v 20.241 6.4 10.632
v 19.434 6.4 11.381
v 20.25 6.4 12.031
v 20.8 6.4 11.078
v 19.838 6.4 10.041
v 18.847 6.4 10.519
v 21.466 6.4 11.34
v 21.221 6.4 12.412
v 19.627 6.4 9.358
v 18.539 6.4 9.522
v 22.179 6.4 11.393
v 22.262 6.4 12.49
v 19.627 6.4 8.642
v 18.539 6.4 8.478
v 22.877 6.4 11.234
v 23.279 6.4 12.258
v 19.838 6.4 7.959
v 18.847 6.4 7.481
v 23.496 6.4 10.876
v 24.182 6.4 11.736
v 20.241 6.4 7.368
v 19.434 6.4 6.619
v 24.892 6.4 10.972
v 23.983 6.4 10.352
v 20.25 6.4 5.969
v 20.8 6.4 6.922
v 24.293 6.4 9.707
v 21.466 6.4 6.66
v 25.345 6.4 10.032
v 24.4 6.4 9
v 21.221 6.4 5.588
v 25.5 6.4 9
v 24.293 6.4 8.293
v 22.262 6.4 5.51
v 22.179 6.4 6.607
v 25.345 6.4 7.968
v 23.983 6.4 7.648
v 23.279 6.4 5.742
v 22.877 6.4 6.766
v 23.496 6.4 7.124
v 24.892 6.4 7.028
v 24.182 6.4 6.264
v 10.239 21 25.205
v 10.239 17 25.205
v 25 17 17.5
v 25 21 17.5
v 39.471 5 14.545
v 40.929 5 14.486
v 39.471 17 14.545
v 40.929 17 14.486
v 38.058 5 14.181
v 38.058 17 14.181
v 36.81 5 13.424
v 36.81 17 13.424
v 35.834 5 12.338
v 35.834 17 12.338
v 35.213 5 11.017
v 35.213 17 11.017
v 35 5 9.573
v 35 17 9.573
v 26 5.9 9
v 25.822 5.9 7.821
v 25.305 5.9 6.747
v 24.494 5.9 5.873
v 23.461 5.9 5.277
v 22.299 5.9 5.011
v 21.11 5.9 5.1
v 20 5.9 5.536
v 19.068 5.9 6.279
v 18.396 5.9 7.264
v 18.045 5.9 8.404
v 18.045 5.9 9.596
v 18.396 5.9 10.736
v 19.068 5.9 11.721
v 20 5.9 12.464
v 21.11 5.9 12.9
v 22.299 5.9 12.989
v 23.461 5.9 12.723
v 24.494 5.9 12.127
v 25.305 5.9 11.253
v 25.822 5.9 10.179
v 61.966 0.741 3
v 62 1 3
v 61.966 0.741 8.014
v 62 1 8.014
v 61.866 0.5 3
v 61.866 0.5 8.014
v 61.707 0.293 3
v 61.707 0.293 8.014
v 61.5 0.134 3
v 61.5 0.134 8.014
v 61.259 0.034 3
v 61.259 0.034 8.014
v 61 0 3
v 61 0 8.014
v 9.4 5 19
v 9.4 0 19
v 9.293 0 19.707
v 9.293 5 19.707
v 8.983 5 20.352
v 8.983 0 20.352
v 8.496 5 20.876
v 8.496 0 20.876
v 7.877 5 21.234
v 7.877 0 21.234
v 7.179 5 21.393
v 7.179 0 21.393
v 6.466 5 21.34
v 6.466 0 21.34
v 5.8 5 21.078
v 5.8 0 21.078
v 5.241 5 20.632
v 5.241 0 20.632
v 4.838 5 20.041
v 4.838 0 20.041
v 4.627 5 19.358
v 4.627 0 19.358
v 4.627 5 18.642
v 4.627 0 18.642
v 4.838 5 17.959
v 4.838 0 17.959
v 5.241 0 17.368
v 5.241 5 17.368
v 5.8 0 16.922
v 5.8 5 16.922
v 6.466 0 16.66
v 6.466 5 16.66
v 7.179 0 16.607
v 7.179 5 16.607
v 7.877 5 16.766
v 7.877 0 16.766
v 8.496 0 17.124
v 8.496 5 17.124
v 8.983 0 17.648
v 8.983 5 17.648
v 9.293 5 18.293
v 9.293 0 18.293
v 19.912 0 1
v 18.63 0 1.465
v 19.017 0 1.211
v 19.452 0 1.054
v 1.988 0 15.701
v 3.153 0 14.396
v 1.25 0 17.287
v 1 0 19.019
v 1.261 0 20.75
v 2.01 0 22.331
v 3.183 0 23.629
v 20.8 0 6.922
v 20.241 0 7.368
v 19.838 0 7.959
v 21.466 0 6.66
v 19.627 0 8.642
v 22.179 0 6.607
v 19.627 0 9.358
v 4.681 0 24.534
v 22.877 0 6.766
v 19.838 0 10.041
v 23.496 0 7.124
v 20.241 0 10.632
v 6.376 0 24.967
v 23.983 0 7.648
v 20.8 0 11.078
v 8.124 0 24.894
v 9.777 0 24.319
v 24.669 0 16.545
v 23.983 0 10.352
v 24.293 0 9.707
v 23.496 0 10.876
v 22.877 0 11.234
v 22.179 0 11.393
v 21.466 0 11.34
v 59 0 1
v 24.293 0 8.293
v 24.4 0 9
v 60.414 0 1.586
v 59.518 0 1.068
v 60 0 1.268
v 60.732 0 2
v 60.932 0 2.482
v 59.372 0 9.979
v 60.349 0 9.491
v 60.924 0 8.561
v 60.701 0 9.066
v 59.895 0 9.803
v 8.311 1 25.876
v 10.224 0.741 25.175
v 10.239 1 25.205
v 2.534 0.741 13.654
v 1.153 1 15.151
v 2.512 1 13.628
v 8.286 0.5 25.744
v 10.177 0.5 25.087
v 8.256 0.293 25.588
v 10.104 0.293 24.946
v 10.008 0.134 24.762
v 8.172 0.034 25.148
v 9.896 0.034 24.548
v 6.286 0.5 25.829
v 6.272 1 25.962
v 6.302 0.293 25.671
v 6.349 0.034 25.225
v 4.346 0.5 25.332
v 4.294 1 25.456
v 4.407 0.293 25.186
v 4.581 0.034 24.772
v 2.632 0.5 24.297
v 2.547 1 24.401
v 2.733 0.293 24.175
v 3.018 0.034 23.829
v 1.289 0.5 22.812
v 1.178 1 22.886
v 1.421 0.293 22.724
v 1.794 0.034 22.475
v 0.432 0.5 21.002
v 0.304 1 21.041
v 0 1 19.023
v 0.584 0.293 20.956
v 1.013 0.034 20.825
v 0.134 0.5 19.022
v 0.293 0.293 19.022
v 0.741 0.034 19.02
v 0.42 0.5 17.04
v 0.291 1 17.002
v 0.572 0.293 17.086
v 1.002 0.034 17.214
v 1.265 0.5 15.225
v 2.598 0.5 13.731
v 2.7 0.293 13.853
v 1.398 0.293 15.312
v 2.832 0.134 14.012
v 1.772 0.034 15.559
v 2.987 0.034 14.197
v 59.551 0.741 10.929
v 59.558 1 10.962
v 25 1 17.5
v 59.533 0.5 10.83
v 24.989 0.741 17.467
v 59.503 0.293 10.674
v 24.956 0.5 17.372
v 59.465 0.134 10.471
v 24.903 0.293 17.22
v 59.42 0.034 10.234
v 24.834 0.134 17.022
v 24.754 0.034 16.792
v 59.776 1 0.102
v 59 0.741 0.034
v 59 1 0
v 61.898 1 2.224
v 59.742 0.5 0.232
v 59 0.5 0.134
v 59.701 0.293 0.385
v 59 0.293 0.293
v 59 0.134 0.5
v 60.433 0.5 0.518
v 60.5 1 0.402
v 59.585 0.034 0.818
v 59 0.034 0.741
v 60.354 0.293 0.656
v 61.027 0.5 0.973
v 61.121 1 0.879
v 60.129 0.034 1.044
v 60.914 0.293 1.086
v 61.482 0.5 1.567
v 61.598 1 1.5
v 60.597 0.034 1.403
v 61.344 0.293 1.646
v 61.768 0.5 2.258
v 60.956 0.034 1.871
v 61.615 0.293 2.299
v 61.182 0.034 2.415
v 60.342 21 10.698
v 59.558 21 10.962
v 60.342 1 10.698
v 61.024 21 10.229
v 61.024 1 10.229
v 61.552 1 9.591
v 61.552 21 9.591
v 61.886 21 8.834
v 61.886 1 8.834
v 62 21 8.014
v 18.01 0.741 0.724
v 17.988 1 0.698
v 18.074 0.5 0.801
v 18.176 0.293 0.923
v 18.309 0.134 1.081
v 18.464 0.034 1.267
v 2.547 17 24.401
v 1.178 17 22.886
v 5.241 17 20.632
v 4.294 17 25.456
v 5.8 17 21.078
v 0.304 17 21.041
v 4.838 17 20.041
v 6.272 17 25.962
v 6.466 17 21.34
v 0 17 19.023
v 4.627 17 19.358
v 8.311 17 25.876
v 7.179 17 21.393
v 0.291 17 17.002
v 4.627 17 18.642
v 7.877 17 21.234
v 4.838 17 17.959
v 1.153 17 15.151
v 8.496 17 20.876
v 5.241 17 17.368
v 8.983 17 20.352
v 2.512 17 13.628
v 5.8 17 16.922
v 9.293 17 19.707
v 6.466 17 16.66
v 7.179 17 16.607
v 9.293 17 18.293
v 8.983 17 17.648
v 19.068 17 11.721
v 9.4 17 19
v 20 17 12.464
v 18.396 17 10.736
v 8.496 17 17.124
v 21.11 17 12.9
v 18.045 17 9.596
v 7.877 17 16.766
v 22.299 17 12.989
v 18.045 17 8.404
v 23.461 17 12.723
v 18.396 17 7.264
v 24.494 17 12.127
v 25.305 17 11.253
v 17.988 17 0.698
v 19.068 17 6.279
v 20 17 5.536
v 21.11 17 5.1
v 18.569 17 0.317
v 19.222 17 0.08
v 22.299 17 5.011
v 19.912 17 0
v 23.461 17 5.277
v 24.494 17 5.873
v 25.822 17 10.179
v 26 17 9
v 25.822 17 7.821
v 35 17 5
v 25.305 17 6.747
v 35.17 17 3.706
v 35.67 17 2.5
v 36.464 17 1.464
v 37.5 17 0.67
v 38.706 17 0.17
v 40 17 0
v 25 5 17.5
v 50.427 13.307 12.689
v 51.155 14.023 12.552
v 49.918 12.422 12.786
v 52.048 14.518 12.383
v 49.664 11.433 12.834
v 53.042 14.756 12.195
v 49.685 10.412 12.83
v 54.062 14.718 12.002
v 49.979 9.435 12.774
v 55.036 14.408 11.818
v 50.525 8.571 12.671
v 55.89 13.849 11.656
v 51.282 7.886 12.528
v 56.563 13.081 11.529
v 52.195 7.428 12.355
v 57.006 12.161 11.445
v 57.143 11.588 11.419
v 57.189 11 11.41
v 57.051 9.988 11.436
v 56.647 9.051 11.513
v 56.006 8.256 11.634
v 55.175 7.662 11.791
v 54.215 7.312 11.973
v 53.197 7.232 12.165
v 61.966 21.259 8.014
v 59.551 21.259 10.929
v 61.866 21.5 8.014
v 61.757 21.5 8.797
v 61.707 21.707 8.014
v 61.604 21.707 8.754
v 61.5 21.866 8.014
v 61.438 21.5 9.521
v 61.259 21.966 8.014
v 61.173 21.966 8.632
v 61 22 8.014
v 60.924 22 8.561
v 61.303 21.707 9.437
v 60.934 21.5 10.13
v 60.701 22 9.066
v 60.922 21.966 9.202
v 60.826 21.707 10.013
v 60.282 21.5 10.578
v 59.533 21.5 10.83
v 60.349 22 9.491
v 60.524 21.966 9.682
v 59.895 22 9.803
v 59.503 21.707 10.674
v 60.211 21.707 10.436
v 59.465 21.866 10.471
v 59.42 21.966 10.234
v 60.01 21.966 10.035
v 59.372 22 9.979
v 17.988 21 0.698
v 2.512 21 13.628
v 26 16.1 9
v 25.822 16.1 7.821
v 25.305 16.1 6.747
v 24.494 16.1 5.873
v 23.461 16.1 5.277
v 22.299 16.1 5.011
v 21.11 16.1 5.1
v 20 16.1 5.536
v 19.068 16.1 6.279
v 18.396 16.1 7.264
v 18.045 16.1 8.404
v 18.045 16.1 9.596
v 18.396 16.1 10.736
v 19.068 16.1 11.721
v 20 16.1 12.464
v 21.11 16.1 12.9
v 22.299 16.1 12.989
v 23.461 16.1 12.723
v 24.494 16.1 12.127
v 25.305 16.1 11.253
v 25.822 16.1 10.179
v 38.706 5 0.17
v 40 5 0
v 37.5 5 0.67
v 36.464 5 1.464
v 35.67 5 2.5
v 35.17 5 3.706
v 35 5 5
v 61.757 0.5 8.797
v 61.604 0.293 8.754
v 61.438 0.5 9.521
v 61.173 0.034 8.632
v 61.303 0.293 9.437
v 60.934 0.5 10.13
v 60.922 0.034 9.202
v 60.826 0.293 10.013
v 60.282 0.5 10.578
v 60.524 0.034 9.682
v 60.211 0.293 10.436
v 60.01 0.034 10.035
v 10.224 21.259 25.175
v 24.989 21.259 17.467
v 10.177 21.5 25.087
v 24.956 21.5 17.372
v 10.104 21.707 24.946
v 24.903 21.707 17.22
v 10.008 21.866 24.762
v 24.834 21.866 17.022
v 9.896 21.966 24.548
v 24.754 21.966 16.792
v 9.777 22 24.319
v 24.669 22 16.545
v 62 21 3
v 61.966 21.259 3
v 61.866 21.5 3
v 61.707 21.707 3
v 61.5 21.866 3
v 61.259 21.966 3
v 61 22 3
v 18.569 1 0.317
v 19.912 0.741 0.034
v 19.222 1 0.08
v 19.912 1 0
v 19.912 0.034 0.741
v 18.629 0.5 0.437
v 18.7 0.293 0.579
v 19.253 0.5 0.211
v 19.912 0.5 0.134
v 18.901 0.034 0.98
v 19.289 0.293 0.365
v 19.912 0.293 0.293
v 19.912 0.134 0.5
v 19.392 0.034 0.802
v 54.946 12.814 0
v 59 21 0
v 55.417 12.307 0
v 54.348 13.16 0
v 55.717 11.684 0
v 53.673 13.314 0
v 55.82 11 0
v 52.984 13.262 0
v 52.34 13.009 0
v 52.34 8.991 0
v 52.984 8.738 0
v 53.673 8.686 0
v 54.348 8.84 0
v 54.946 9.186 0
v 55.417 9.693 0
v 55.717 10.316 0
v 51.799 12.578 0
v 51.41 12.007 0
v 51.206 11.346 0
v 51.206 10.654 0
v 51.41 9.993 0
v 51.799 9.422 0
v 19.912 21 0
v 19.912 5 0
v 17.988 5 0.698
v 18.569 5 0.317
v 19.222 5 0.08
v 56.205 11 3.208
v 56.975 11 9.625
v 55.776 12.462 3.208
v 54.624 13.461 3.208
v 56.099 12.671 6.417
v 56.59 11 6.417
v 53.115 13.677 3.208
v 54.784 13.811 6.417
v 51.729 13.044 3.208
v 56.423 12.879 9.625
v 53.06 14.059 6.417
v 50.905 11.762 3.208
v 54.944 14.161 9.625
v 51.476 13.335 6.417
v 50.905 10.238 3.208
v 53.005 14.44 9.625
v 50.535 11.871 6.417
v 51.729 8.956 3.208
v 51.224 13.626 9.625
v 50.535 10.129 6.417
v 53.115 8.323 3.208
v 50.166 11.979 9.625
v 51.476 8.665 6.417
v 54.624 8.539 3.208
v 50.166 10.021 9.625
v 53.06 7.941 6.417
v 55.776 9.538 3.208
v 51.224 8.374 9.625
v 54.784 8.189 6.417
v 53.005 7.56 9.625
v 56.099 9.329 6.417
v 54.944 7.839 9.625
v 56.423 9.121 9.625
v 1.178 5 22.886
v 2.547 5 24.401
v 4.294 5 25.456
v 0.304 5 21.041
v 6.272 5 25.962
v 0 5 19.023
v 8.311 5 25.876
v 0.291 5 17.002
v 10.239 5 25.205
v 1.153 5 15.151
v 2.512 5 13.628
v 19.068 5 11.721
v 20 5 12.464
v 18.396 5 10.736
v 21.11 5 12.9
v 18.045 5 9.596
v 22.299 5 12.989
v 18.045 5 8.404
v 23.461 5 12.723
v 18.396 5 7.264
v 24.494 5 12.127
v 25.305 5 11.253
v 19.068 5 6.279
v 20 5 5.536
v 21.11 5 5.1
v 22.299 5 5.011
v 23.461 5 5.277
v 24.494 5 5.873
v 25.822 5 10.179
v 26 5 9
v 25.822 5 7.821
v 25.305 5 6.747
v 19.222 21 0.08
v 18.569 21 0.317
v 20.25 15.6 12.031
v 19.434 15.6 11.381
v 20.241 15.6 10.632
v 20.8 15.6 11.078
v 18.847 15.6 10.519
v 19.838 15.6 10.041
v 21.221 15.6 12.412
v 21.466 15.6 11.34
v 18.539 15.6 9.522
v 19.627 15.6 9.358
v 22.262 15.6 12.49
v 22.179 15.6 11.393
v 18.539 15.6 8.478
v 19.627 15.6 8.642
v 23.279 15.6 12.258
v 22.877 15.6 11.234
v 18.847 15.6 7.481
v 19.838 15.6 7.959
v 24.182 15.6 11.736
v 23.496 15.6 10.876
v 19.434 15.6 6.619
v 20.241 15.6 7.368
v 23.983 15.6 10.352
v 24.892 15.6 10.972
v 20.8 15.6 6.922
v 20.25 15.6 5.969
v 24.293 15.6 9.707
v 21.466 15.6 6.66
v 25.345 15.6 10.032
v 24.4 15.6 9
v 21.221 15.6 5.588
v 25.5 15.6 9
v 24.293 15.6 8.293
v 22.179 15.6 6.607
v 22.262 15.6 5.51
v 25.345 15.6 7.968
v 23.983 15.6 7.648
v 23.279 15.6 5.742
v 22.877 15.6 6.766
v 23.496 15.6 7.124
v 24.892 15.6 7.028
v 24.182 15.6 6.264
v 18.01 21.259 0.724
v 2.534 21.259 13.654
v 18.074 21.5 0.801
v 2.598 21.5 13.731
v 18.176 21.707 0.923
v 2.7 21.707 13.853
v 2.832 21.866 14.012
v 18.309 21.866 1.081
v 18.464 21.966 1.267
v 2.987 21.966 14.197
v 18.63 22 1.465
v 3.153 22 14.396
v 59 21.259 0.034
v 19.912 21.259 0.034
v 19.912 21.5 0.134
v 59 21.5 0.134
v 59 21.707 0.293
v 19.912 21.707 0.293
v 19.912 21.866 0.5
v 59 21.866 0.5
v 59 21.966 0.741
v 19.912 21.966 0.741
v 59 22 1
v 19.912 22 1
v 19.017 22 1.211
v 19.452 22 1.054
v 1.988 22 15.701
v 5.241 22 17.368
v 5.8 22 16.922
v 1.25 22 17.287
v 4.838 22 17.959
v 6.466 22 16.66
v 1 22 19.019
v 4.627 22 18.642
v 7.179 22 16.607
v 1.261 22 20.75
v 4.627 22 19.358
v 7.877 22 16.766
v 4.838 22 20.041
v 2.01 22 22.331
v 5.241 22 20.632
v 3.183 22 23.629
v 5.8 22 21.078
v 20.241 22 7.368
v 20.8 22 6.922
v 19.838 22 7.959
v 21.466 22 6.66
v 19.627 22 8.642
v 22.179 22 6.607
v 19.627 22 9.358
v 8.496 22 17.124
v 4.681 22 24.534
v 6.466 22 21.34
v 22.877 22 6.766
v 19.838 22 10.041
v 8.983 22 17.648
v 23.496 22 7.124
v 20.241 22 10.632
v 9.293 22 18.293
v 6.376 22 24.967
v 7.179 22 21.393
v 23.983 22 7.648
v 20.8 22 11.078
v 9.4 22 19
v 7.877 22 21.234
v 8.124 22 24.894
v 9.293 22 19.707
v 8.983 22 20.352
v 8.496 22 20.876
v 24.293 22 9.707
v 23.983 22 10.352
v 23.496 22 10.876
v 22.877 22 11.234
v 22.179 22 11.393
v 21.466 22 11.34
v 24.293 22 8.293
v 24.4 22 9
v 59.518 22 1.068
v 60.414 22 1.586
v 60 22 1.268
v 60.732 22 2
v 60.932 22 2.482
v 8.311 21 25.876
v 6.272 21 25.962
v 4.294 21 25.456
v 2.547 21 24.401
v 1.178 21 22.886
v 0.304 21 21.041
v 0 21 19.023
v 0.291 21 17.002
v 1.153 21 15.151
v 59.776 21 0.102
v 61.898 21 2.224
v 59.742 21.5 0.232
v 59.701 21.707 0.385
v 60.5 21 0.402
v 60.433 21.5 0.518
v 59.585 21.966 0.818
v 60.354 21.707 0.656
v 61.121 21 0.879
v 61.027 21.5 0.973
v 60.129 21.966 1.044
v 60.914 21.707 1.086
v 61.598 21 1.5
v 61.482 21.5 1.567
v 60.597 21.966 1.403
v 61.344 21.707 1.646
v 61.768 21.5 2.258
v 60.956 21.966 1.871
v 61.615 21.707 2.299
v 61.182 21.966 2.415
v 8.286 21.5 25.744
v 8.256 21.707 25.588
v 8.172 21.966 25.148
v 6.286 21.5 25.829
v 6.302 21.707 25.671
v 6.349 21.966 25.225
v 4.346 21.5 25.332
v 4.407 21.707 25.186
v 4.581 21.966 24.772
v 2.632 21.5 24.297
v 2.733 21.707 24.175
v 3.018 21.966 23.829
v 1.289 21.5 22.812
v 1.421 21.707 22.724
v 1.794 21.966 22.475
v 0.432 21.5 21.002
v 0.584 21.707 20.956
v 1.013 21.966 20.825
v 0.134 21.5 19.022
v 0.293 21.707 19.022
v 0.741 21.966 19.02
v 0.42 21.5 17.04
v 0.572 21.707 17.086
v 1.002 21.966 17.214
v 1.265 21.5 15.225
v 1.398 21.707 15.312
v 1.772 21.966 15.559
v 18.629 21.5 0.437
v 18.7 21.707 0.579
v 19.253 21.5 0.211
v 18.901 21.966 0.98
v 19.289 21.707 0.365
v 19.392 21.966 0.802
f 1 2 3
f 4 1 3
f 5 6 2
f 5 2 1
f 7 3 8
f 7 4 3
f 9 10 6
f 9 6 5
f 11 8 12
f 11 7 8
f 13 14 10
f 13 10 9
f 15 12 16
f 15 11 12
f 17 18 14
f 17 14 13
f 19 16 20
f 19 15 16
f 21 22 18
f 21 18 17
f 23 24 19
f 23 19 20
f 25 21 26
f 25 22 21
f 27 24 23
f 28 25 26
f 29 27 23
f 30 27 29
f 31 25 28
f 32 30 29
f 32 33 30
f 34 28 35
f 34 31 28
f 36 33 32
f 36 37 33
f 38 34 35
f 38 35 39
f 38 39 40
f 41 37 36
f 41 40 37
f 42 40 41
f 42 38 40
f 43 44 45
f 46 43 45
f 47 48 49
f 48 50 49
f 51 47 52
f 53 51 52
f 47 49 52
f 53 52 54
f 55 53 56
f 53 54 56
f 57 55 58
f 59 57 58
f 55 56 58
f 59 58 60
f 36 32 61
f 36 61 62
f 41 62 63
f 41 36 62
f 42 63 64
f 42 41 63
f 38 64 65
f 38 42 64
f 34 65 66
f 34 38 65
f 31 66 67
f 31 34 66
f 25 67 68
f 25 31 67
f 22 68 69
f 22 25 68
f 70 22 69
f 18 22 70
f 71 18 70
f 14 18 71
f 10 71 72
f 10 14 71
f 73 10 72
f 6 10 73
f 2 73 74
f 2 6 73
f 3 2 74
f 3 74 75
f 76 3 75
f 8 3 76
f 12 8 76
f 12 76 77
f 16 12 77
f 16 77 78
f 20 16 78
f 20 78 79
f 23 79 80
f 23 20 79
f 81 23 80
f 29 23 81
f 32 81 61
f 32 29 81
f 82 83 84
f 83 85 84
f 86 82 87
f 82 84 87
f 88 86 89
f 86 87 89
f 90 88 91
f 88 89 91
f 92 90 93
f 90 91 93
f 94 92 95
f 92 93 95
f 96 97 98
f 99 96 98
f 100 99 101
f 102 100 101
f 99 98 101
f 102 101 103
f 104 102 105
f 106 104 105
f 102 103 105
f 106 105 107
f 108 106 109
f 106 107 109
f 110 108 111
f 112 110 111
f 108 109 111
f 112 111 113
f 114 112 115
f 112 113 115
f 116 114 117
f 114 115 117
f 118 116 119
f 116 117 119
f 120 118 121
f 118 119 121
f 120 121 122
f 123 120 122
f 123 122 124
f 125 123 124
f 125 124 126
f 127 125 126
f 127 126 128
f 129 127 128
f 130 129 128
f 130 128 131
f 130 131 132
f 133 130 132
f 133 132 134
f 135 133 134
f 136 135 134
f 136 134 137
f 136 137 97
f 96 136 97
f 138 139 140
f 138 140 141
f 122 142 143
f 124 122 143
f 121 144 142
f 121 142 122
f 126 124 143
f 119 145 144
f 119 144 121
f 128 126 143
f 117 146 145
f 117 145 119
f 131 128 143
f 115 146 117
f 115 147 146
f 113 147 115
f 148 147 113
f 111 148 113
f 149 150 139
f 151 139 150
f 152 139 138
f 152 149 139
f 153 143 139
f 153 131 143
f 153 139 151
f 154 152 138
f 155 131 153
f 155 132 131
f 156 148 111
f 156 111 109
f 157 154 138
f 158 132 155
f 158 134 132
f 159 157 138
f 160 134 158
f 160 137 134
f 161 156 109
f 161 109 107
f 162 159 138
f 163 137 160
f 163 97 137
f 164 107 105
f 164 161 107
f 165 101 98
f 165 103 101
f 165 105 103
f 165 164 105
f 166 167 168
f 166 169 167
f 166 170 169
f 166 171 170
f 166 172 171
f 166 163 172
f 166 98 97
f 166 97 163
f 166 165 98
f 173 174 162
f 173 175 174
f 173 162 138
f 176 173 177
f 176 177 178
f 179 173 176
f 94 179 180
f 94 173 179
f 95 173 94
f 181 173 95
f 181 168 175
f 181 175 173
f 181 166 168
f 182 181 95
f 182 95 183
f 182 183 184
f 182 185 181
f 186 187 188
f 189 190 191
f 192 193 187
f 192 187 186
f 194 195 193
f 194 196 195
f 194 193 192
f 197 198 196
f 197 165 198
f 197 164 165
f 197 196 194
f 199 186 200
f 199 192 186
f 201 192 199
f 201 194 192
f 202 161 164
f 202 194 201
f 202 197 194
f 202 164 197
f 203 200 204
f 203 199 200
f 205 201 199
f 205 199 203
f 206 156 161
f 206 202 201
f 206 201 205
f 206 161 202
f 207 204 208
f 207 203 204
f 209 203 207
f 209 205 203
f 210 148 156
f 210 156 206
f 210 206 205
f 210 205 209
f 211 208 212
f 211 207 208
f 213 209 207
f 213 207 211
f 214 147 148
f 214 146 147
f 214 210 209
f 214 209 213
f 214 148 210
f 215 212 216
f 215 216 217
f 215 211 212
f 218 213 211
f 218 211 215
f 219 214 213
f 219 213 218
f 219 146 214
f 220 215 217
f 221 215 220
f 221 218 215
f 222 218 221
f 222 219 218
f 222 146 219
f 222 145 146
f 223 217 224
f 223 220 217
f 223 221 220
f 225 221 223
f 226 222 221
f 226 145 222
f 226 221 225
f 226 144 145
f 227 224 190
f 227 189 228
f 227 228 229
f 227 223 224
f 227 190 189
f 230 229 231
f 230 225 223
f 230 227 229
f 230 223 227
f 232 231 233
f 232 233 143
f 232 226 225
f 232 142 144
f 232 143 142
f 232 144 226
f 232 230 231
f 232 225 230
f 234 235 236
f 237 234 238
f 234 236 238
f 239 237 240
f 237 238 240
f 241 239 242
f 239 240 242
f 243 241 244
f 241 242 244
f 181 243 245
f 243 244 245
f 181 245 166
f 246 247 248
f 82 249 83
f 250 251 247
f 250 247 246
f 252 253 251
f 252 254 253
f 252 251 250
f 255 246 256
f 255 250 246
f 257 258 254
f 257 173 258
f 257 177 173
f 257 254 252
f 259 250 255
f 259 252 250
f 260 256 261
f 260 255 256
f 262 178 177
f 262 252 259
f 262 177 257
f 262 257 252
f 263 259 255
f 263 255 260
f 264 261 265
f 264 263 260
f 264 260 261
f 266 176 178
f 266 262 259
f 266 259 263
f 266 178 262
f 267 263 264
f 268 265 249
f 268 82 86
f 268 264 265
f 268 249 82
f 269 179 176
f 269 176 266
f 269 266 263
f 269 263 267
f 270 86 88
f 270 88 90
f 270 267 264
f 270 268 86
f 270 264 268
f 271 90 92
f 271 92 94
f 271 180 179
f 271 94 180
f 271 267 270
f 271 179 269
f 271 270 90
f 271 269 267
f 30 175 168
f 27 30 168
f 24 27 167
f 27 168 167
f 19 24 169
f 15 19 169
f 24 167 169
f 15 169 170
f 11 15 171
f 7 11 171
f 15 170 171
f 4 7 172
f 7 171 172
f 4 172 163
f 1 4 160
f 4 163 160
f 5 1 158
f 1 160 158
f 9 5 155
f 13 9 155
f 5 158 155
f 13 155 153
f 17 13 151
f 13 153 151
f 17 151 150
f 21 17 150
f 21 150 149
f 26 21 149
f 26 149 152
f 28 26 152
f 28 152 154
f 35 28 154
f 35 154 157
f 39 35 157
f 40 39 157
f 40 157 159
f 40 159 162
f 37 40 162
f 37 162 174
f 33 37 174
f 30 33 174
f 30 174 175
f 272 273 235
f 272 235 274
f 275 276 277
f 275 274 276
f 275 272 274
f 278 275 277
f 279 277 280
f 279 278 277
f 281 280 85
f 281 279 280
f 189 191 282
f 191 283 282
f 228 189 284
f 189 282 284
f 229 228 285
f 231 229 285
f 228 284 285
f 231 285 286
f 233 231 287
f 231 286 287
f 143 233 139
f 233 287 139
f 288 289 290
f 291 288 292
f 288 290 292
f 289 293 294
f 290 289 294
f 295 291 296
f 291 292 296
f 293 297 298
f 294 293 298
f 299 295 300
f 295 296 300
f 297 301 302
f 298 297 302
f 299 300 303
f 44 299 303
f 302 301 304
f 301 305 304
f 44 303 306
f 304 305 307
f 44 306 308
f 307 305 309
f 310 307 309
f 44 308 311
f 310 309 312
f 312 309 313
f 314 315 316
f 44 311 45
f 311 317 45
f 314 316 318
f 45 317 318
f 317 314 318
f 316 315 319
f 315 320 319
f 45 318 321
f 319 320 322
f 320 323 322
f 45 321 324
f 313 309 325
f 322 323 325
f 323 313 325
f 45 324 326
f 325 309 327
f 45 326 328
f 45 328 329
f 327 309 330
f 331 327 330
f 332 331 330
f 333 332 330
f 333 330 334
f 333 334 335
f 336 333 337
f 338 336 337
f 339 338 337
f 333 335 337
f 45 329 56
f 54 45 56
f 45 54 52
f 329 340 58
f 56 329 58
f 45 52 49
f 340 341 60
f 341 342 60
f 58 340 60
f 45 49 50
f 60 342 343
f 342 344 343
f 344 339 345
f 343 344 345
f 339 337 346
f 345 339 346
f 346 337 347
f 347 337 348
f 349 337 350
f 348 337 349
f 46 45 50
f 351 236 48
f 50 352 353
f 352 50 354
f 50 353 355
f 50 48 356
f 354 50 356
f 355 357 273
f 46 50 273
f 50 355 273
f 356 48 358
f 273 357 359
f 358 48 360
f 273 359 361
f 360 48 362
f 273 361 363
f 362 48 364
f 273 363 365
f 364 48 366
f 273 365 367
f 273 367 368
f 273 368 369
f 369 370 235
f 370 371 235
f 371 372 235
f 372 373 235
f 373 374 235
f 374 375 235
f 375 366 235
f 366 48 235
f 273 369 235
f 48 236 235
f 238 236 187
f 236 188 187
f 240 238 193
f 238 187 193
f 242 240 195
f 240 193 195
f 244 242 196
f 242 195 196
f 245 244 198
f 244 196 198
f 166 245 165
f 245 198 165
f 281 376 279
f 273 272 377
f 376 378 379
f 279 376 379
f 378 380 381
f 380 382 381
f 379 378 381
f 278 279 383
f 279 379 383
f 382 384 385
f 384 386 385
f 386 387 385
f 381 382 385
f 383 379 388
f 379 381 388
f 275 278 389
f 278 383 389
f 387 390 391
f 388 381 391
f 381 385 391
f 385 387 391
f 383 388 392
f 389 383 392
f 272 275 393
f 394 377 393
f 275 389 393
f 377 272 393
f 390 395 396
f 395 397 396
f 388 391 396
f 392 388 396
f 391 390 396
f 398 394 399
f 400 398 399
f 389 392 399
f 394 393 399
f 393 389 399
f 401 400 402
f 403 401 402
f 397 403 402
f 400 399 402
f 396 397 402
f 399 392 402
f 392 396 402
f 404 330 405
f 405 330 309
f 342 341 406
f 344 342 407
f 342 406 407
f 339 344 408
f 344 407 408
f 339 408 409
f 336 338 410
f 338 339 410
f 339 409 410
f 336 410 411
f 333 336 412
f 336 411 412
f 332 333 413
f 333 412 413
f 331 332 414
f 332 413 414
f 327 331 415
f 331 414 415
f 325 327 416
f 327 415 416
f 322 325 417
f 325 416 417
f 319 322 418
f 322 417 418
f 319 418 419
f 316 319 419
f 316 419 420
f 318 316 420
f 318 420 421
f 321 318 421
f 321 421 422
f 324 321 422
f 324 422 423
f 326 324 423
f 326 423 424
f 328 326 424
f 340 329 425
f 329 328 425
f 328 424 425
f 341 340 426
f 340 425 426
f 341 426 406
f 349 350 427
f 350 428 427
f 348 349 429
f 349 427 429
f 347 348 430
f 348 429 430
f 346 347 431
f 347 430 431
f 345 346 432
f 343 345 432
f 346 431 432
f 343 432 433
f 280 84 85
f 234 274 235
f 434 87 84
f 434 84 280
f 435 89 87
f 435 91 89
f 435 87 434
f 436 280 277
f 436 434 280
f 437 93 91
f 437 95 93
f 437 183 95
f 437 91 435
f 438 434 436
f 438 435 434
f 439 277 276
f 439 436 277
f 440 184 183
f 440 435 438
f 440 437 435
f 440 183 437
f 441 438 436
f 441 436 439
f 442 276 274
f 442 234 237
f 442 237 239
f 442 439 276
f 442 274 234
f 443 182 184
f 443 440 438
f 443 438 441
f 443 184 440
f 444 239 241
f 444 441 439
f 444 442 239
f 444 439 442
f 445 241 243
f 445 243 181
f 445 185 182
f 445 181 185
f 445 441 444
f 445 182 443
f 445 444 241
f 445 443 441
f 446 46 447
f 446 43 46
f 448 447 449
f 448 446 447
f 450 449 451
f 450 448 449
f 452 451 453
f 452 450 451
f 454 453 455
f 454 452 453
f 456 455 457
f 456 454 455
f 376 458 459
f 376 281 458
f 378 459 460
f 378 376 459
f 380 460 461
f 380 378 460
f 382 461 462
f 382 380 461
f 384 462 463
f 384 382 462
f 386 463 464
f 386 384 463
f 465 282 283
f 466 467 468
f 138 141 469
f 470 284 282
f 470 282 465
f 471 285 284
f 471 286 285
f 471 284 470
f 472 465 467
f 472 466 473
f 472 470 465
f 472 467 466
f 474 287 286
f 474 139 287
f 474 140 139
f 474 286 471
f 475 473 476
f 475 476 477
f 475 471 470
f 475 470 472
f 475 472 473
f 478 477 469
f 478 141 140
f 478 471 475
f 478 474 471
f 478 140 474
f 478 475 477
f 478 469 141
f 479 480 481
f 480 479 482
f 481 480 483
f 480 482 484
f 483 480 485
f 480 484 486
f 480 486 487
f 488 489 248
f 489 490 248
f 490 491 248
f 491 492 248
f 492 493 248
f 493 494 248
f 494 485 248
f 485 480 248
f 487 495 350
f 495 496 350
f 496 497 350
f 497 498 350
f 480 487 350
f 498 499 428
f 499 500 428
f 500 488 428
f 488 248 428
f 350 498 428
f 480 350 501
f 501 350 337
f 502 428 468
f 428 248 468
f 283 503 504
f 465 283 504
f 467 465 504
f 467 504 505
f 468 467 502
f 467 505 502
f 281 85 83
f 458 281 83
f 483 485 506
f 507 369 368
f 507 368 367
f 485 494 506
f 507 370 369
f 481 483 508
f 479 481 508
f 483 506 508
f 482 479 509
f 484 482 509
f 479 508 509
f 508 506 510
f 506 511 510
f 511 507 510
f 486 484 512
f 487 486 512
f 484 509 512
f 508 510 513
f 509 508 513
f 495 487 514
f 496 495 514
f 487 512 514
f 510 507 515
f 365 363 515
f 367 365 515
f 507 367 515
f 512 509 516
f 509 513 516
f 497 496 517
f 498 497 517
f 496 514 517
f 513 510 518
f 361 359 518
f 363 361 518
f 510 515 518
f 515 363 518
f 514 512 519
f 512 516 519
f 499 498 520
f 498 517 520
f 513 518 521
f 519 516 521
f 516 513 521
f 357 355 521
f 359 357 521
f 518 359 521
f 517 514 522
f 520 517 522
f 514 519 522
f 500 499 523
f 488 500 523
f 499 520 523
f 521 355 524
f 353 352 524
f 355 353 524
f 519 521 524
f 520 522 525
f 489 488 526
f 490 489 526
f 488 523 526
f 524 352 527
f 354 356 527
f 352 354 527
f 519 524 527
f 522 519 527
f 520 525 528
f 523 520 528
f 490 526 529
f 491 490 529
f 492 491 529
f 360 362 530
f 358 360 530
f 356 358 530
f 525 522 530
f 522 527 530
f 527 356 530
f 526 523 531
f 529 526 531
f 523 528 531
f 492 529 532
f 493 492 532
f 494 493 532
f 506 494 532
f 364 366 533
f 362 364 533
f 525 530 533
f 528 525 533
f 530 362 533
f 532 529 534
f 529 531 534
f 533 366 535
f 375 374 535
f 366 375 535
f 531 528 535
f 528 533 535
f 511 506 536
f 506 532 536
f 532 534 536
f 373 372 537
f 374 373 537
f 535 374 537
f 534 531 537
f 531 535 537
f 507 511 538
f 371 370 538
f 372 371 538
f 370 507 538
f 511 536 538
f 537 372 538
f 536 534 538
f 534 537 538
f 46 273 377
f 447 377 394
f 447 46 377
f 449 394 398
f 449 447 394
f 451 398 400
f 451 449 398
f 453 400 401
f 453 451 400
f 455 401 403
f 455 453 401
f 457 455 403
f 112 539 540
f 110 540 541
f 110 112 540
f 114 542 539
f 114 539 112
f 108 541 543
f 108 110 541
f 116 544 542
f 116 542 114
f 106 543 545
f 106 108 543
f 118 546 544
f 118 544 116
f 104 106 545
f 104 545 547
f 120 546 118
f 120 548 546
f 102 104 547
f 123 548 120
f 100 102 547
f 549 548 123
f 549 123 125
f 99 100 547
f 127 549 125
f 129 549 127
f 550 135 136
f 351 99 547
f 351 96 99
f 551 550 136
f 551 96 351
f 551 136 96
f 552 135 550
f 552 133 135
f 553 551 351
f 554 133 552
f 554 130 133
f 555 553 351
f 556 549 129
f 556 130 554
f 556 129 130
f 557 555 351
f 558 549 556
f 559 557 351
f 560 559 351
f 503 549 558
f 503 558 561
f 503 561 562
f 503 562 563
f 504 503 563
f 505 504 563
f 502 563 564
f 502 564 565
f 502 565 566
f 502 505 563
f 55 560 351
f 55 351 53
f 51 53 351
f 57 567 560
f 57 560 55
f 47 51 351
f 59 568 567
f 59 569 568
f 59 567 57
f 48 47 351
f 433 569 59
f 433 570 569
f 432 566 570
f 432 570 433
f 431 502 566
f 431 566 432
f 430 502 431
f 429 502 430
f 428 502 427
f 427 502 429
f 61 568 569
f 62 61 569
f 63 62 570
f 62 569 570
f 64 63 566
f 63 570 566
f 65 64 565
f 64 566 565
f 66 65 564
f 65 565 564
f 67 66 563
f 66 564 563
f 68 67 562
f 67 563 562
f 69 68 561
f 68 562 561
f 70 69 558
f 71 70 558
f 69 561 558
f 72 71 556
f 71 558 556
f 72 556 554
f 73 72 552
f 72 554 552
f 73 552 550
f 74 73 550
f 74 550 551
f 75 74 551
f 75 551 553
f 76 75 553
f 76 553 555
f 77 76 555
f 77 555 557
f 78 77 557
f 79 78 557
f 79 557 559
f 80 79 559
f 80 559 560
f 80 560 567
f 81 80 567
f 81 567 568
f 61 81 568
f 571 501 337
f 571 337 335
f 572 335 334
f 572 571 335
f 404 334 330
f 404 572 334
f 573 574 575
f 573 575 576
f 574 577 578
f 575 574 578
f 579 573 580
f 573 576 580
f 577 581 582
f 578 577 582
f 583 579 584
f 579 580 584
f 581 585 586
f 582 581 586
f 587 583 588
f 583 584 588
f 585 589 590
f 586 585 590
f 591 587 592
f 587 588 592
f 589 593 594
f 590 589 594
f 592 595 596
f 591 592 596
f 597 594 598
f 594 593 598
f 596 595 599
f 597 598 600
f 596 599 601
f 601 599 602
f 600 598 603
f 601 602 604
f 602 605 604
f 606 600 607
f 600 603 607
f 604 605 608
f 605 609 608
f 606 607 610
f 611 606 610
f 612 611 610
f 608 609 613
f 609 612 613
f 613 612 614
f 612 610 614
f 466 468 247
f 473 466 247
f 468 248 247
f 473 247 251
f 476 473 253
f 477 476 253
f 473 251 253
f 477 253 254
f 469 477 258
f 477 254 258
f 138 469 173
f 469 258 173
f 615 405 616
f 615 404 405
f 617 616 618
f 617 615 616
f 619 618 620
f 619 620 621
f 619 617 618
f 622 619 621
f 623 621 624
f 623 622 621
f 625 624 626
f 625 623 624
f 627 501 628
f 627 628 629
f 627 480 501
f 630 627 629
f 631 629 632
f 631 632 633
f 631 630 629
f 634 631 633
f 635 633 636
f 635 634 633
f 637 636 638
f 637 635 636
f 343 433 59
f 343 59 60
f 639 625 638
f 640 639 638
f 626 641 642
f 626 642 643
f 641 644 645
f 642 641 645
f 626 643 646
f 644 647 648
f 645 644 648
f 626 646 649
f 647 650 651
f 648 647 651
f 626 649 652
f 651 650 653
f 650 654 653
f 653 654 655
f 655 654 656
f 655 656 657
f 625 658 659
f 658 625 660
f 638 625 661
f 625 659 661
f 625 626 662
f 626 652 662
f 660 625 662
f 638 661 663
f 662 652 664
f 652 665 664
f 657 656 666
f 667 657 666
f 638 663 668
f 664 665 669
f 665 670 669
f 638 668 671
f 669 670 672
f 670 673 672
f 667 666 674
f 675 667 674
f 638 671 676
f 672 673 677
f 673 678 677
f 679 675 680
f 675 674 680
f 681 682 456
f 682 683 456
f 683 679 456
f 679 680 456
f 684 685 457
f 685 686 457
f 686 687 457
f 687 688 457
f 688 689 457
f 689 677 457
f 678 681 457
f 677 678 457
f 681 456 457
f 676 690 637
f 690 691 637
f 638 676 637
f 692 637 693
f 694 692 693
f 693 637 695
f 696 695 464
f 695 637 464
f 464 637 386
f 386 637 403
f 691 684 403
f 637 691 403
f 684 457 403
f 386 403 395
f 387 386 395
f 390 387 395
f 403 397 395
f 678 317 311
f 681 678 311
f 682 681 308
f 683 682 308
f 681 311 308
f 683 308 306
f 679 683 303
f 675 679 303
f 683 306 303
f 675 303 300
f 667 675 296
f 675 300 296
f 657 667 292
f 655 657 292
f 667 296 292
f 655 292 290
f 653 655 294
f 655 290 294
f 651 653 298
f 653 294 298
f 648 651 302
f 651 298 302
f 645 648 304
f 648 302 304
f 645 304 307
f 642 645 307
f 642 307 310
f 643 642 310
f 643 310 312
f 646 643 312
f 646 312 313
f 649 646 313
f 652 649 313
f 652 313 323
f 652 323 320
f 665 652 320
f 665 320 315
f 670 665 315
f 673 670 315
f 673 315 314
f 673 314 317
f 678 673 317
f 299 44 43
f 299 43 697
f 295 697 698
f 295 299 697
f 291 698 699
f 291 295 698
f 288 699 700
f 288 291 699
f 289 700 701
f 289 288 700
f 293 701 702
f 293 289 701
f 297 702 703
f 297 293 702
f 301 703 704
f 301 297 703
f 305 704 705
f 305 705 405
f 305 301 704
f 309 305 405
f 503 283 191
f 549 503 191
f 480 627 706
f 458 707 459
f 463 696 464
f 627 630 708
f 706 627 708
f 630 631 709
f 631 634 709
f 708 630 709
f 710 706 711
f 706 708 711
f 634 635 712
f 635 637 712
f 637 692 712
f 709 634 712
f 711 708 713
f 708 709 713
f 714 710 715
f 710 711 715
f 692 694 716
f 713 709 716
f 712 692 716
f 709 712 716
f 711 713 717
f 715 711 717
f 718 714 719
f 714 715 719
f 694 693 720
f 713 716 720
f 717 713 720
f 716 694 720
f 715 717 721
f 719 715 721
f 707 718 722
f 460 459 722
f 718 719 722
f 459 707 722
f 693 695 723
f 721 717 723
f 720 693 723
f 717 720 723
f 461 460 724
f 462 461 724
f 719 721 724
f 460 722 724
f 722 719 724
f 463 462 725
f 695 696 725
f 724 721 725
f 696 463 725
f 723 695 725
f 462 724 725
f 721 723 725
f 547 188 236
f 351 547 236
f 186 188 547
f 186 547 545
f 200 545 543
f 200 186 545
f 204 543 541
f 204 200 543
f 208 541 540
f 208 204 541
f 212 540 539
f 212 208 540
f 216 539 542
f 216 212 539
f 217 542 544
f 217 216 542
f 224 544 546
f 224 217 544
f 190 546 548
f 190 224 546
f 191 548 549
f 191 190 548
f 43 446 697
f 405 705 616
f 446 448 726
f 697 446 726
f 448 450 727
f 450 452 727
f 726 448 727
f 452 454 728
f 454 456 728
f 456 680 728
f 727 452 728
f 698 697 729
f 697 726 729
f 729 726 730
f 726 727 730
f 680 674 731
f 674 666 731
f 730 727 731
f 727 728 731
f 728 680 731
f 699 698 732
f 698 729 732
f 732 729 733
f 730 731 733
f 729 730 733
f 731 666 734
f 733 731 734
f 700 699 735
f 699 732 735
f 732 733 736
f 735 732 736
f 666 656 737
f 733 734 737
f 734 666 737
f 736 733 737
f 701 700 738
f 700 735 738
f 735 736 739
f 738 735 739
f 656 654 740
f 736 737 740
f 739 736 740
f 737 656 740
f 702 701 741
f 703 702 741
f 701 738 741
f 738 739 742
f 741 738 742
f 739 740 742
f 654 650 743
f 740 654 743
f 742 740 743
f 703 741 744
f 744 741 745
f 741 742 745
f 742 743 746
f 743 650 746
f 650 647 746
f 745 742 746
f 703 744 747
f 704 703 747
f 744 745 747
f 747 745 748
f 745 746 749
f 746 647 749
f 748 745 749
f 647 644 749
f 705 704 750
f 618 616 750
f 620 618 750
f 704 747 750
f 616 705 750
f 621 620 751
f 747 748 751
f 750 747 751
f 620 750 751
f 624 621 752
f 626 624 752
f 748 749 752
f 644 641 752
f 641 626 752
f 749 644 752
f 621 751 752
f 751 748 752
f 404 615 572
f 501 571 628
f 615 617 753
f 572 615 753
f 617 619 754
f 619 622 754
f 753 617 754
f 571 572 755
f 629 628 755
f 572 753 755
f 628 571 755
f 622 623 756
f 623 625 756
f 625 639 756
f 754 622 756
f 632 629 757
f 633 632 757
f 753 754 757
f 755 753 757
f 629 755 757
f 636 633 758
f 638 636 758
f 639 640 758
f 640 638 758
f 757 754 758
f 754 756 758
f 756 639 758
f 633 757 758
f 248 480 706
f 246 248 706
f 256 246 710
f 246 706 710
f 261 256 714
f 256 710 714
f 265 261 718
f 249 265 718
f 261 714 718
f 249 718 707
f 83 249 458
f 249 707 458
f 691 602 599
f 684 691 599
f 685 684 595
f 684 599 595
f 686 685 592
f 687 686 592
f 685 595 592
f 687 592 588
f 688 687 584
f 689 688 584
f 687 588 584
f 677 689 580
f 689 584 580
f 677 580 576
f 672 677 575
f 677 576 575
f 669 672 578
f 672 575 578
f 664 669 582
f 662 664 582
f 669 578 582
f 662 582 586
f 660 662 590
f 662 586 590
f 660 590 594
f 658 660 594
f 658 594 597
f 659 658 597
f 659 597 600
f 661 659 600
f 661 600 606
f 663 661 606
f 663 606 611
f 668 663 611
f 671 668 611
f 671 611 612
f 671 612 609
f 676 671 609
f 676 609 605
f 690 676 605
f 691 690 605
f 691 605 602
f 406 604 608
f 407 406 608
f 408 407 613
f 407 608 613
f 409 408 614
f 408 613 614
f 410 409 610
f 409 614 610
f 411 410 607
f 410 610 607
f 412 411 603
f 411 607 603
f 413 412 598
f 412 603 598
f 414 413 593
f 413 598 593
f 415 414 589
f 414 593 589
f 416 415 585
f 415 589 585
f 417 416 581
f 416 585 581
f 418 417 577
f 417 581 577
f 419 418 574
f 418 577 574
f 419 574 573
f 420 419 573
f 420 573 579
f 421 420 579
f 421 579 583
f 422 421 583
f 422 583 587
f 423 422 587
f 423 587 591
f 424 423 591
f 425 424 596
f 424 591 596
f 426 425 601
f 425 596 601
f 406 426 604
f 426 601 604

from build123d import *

# Parameters (mm, degrees)
CYLINDER007_R          = 4
CYLINDER007_DEPTH      = 5
CYLINDER007_ROLL_ANGLE = -90
CYLINDER008_R          = 4
CYLINDER008_DEPTH      = 5
CYLINDER008_ROLL_ANGLE = -90
CHAMFER001_SIZE        = 0.5
BOX014_W               = 36
BOX014_H               = 12
BOX014_DEPTH           = 31
SKETCH013_R            = 2.4
PAD011_DEPTH           = 22
FILLET017_R            = 3
FILLET018_R            = 5
FILLET019_R            = 1


with BuildPart() as cone:
    # Cone → Cone (revolve)
    with BuildSketch(Plane(origin=(53.5, 11, -1), x_dir=(1, 0, 0), z_dir=(0, -1, 0))):
        Polygon((0, 0), (2.2, 0), (4, 15), (0, 15), align=None)
    revolve(axis=Axis((53.5, 11, -1), (0, 0, 1)))


with BuildPart() as cylinder007:
    # Cylinder007 → Cylinder007 (new body)
    with BuildSketch(Plane.XY):
        Circle(CYLINDER007_R)
    extrude(amount=CYLINDER007_DEPTH)


with BuildPart() as cylinder007_1:
    # Cylinder007 roll: moved
    add(cylinder007.part.rotate(Axis((0, 0, 0), (1, 0, 0)), CYLINDER007_ROLL_ANGLE))


with BuildPart() as cylinder007_2:
    # Cylinder007 placement: moved
    add(cylinder007_1.part.moved(Location((22, 15.6, 9))))


with BuildPart() as chamfer001:
    # Cylinder008 → Cylinder008 (new body)
    with BuildSketch(Plane.XY):
        Circle(CYLINDER008_R)
    extrude(amount=CYLINDER008_DEPTH)


with BuildPart() as chamfer001_1:
    # Cylinder008 roll: moved
    add(chamfer001.part.rotate(Axis((0, 0, 0), (1, 0, 0)), CYLINDER008_ROLL_ANGLE))


with BuildPart() as chamfer001_2:
    # Cylinder008 placement: moved
    add(chamfer001_1.part.moved(Location((22, 1.4, 9))))

    # Fusion008: union Cylinder007
    add(cylinder007_2.part)

    # Chamfer001
    chamfer001_edges = [chamfer001_2.edges().sort_by_distance(p)[0] for p in [
        (18, 15.6, 9),
        (18, 6.4, 9),
    ]]
    chamfer(chamfer001_edges, length=CHAMFER001_SIZE)


with BuildPart() as cut022:
    # Box014 → Box014 (new body)
    with BuildSketch(Plane(origin=(-1, 5, -2), x_dir=(1, 0, 0), z_dir=(0, 0, 1))):
        with Locations((18, 6)):
            Rectangle(BOX014_W, BOX014_H)
    extrude(amount=BOX014_DEPTH)

    # Cut022: cut Chamfer001
    add(chamfer001_2.part, mode=Mode.SUBTRACT)


with BuildPart() as cut024:
    # Sketch013 → Pad011 (new body)
    with BuildSketch(Plane.XZ):
        with BuildLine():
            ThreePointArc((10.239335, 25.205378), (1.177797, 22.886123), (2.51191, 13.628125))
            Line((18.823529, 0), (2.51191, 13.628125))
            Line((62, 0), (18.823529, 0))
            Line((62, 10.5), (62, 0))
            Line((25, 17.5), (62, 10.5))
            Line((10.239335, 25.205378), (25, 17.5))
        make_face()
        with Locations((7, 19)):
            Circle(SKETCH013_R, mode=Mode.SUBTRACT)
        with Locations((22, 9)):
            Circle(SKETCH013_R, mode=Mode.SUBTRACT)
    extrude(amount=-PAD011_DEPTH)

    # Cut023: cut Cut022
    add(cut022.part, mode=Mode.SUBTRACT)

    # Fillet017
    fillet017_edges = [cut024.edges().sort_by_distance(p)[0] for p in [
        (18.823529, 2.5, 0),
        (18.823529, 19.5, 0),
        (62, 11, 0),
        (62, 11, 10.5),
    ]]
    fillet(fillet017_edges, radius=FILLET017_R)

    # Fillet018
    fillet018_edges = [cut024.edges().sort_by_distance(p)[0] for p in [
        (35, 11, 0),
        (35, 11, 15.608108),
    ]]
    fillet(fillet018_edges, radius=FILLET018_R)

    # Fillet019
    fillet019_edges = [cut024.edges().sort_by_distance(p)[0] for p in [
        (1.177797, 0, 22.886123),
        (1.177797, 22, 22.886123),
    ]]
    fillet(fillet019_edges, radius=FILLET019_R)

    # Cut024: cut Cone
    add(cone.part, mode=Mode.SUBTRACT)


solid = cut024.part
